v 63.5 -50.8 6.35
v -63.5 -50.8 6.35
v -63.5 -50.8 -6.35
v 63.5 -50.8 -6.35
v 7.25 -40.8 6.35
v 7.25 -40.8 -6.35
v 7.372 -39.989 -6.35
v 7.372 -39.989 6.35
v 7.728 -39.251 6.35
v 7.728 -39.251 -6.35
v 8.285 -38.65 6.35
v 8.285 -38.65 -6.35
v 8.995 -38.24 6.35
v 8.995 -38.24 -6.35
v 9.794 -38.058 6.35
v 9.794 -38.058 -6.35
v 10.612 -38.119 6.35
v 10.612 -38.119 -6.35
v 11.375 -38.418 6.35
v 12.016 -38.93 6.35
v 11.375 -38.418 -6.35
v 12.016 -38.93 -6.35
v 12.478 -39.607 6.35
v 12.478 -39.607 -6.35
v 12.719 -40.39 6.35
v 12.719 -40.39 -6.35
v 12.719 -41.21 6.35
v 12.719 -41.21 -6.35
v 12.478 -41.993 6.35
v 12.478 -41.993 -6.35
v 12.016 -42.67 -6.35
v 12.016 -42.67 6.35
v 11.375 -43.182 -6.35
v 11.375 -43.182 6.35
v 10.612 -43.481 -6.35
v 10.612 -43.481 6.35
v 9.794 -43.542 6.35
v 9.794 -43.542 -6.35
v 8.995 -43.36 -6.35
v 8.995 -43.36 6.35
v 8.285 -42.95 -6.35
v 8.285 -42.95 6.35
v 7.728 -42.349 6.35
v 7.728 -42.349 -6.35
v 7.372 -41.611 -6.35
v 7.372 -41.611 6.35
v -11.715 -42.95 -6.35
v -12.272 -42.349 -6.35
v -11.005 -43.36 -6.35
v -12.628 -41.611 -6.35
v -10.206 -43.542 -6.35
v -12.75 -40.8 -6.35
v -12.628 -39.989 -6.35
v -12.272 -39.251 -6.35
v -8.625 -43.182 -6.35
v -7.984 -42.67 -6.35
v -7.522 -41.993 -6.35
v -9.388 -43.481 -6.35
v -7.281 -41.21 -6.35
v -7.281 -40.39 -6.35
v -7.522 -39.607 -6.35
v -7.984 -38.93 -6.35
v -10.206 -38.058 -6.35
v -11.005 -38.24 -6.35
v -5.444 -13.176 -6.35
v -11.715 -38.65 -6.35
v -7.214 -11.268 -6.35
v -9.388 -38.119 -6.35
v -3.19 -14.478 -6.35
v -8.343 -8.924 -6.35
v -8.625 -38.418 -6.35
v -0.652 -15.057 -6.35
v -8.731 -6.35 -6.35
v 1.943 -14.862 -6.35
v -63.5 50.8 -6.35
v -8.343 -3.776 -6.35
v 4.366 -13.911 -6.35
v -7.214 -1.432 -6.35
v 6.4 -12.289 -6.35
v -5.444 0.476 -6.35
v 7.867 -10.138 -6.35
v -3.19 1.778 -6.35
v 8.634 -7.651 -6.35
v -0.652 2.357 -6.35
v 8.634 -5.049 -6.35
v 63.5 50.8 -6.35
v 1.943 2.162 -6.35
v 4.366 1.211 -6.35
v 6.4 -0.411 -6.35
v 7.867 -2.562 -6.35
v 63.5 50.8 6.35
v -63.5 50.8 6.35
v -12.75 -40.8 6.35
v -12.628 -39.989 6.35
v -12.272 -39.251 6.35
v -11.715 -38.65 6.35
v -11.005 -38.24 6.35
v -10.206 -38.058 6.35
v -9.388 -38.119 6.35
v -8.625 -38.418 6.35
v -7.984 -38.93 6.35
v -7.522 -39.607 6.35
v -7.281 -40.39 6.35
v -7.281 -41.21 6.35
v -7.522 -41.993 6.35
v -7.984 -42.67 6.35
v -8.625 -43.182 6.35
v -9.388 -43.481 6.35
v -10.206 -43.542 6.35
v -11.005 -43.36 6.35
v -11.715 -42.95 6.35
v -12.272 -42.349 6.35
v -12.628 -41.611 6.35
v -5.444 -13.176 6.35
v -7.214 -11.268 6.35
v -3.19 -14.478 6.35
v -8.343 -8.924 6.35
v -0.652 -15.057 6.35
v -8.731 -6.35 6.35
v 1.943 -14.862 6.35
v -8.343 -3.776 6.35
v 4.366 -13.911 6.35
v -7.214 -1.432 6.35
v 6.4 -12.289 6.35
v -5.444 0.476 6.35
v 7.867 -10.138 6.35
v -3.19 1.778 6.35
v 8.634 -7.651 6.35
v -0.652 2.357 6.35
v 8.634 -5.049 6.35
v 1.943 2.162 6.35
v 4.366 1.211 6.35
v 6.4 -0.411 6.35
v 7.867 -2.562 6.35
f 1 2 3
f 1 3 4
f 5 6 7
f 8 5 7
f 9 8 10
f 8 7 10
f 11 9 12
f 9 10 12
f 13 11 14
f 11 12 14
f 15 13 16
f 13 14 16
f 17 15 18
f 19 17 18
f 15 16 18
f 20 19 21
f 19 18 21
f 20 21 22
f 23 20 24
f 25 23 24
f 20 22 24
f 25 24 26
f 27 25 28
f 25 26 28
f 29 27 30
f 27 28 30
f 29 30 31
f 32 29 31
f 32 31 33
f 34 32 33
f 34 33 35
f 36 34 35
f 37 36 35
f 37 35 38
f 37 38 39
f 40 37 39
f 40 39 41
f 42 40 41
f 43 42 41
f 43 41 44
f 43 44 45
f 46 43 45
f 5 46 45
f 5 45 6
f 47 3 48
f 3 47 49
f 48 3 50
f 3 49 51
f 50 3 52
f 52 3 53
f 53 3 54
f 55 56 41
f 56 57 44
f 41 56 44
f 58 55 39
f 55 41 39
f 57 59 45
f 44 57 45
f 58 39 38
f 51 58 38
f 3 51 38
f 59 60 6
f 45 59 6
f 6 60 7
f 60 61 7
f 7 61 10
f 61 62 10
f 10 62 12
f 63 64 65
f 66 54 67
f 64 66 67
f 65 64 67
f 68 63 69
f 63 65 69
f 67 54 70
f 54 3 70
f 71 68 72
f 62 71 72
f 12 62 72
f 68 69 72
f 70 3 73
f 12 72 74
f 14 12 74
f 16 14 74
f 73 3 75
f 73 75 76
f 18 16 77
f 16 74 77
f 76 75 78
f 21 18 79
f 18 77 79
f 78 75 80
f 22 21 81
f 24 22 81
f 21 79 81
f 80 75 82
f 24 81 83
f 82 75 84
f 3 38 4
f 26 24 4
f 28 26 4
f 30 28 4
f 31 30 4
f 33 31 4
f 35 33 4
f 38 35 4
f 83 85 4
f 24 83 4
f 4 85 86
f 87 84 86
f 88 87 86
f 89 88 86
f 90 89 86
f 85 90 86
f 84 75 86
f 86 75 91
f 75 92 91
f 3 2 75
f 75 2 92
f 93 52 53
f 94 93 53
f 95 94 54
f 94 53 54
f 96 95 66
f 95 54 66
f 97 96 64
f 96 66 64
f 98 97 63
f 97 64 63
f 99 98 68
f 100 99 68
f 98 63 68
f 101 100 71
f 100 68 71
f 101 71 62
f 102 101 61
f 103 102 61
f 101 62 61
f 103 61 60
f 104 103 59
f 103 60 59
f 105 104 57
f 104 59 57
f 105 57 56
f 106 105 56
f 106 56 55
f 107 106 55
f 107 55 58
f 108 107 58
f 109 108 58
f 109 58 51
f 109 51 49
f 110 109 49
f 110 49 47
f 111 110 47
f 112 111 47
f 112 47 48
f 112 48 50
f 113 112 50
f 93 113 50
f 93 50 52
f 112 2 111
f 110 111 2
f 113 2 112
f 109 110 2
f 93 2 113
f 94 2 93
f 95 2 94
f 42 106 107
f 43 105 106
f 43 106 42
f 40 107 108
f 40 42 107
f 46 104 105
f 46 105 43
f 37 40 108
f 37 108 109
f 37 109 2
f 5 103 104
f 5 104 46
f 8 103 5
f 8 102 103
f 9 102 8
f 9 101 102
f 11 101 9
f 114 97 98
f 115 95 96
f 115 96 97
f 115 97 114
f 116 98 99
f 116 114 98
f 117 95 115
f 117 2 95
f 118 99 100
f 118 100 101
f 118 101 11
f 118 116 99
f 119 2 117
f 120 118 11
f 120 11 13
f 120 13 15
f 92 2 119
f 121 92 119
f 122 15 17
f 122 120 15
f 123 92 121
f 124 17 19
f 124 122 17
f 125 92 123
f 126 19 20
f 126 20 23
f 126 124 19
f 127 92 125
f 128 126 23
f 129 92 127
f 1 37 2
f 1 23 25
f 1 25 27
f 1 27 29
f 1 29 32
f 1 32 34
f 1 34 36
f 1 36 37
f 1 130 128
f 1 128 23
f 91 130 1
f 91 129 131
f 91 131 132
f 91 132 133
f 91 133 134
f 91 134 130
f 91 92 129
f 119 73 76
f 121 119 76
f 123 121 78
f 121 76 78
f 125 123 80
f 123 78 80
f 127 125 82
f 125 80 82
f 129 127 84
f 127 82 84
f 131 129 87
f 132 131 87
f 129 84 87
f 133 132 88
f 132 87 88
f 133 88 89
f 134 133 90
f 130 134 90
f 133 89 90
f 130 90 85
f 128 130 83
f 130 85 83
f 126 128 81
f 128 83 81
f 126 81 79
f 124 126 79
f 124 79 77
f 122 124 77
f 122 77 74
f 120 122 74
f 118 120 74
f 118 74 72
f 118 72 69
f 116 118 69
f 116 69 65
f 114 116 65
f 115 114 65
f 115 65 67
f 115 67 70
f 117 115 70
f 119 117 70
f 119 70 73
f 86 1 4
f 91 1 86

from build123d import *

# Parameters (mm, degrees)
SKETCH1_W            = 127
SKETCH1_H            = 101.6
BOSS_EXTRUDE1_DEPTH  = 6.35
HOLE2_D              = 17.4625
M4_CLEARANCE_HOLE1_D = 5.5


with BuildPart() as part:
    # Sketch1 → Boss-Extrude1 (new, symmetric)
    with BuildSketch(Plane.XY):
        Rectangle(SKETCH1_W, SKETCH1_H)
    extrude(amount=BOSS_EXTRUDE1_DEPTH, both=True)

    # Hole2 (through all)
    with Locations(Plane.XY.offset(6.35)):
        with Locations((0, -6.35)):
            Hole(HOLE2_D / 2)

    # M4 Clearance Hole1 (through all)
    with Locations(Plane.XY.offset(6.35)):
        with Locations((-10, -40.8), (10, -40.8)):
            Hole(M4_CLEARANCE_HOLE1_D / 2)


solid = part.part
